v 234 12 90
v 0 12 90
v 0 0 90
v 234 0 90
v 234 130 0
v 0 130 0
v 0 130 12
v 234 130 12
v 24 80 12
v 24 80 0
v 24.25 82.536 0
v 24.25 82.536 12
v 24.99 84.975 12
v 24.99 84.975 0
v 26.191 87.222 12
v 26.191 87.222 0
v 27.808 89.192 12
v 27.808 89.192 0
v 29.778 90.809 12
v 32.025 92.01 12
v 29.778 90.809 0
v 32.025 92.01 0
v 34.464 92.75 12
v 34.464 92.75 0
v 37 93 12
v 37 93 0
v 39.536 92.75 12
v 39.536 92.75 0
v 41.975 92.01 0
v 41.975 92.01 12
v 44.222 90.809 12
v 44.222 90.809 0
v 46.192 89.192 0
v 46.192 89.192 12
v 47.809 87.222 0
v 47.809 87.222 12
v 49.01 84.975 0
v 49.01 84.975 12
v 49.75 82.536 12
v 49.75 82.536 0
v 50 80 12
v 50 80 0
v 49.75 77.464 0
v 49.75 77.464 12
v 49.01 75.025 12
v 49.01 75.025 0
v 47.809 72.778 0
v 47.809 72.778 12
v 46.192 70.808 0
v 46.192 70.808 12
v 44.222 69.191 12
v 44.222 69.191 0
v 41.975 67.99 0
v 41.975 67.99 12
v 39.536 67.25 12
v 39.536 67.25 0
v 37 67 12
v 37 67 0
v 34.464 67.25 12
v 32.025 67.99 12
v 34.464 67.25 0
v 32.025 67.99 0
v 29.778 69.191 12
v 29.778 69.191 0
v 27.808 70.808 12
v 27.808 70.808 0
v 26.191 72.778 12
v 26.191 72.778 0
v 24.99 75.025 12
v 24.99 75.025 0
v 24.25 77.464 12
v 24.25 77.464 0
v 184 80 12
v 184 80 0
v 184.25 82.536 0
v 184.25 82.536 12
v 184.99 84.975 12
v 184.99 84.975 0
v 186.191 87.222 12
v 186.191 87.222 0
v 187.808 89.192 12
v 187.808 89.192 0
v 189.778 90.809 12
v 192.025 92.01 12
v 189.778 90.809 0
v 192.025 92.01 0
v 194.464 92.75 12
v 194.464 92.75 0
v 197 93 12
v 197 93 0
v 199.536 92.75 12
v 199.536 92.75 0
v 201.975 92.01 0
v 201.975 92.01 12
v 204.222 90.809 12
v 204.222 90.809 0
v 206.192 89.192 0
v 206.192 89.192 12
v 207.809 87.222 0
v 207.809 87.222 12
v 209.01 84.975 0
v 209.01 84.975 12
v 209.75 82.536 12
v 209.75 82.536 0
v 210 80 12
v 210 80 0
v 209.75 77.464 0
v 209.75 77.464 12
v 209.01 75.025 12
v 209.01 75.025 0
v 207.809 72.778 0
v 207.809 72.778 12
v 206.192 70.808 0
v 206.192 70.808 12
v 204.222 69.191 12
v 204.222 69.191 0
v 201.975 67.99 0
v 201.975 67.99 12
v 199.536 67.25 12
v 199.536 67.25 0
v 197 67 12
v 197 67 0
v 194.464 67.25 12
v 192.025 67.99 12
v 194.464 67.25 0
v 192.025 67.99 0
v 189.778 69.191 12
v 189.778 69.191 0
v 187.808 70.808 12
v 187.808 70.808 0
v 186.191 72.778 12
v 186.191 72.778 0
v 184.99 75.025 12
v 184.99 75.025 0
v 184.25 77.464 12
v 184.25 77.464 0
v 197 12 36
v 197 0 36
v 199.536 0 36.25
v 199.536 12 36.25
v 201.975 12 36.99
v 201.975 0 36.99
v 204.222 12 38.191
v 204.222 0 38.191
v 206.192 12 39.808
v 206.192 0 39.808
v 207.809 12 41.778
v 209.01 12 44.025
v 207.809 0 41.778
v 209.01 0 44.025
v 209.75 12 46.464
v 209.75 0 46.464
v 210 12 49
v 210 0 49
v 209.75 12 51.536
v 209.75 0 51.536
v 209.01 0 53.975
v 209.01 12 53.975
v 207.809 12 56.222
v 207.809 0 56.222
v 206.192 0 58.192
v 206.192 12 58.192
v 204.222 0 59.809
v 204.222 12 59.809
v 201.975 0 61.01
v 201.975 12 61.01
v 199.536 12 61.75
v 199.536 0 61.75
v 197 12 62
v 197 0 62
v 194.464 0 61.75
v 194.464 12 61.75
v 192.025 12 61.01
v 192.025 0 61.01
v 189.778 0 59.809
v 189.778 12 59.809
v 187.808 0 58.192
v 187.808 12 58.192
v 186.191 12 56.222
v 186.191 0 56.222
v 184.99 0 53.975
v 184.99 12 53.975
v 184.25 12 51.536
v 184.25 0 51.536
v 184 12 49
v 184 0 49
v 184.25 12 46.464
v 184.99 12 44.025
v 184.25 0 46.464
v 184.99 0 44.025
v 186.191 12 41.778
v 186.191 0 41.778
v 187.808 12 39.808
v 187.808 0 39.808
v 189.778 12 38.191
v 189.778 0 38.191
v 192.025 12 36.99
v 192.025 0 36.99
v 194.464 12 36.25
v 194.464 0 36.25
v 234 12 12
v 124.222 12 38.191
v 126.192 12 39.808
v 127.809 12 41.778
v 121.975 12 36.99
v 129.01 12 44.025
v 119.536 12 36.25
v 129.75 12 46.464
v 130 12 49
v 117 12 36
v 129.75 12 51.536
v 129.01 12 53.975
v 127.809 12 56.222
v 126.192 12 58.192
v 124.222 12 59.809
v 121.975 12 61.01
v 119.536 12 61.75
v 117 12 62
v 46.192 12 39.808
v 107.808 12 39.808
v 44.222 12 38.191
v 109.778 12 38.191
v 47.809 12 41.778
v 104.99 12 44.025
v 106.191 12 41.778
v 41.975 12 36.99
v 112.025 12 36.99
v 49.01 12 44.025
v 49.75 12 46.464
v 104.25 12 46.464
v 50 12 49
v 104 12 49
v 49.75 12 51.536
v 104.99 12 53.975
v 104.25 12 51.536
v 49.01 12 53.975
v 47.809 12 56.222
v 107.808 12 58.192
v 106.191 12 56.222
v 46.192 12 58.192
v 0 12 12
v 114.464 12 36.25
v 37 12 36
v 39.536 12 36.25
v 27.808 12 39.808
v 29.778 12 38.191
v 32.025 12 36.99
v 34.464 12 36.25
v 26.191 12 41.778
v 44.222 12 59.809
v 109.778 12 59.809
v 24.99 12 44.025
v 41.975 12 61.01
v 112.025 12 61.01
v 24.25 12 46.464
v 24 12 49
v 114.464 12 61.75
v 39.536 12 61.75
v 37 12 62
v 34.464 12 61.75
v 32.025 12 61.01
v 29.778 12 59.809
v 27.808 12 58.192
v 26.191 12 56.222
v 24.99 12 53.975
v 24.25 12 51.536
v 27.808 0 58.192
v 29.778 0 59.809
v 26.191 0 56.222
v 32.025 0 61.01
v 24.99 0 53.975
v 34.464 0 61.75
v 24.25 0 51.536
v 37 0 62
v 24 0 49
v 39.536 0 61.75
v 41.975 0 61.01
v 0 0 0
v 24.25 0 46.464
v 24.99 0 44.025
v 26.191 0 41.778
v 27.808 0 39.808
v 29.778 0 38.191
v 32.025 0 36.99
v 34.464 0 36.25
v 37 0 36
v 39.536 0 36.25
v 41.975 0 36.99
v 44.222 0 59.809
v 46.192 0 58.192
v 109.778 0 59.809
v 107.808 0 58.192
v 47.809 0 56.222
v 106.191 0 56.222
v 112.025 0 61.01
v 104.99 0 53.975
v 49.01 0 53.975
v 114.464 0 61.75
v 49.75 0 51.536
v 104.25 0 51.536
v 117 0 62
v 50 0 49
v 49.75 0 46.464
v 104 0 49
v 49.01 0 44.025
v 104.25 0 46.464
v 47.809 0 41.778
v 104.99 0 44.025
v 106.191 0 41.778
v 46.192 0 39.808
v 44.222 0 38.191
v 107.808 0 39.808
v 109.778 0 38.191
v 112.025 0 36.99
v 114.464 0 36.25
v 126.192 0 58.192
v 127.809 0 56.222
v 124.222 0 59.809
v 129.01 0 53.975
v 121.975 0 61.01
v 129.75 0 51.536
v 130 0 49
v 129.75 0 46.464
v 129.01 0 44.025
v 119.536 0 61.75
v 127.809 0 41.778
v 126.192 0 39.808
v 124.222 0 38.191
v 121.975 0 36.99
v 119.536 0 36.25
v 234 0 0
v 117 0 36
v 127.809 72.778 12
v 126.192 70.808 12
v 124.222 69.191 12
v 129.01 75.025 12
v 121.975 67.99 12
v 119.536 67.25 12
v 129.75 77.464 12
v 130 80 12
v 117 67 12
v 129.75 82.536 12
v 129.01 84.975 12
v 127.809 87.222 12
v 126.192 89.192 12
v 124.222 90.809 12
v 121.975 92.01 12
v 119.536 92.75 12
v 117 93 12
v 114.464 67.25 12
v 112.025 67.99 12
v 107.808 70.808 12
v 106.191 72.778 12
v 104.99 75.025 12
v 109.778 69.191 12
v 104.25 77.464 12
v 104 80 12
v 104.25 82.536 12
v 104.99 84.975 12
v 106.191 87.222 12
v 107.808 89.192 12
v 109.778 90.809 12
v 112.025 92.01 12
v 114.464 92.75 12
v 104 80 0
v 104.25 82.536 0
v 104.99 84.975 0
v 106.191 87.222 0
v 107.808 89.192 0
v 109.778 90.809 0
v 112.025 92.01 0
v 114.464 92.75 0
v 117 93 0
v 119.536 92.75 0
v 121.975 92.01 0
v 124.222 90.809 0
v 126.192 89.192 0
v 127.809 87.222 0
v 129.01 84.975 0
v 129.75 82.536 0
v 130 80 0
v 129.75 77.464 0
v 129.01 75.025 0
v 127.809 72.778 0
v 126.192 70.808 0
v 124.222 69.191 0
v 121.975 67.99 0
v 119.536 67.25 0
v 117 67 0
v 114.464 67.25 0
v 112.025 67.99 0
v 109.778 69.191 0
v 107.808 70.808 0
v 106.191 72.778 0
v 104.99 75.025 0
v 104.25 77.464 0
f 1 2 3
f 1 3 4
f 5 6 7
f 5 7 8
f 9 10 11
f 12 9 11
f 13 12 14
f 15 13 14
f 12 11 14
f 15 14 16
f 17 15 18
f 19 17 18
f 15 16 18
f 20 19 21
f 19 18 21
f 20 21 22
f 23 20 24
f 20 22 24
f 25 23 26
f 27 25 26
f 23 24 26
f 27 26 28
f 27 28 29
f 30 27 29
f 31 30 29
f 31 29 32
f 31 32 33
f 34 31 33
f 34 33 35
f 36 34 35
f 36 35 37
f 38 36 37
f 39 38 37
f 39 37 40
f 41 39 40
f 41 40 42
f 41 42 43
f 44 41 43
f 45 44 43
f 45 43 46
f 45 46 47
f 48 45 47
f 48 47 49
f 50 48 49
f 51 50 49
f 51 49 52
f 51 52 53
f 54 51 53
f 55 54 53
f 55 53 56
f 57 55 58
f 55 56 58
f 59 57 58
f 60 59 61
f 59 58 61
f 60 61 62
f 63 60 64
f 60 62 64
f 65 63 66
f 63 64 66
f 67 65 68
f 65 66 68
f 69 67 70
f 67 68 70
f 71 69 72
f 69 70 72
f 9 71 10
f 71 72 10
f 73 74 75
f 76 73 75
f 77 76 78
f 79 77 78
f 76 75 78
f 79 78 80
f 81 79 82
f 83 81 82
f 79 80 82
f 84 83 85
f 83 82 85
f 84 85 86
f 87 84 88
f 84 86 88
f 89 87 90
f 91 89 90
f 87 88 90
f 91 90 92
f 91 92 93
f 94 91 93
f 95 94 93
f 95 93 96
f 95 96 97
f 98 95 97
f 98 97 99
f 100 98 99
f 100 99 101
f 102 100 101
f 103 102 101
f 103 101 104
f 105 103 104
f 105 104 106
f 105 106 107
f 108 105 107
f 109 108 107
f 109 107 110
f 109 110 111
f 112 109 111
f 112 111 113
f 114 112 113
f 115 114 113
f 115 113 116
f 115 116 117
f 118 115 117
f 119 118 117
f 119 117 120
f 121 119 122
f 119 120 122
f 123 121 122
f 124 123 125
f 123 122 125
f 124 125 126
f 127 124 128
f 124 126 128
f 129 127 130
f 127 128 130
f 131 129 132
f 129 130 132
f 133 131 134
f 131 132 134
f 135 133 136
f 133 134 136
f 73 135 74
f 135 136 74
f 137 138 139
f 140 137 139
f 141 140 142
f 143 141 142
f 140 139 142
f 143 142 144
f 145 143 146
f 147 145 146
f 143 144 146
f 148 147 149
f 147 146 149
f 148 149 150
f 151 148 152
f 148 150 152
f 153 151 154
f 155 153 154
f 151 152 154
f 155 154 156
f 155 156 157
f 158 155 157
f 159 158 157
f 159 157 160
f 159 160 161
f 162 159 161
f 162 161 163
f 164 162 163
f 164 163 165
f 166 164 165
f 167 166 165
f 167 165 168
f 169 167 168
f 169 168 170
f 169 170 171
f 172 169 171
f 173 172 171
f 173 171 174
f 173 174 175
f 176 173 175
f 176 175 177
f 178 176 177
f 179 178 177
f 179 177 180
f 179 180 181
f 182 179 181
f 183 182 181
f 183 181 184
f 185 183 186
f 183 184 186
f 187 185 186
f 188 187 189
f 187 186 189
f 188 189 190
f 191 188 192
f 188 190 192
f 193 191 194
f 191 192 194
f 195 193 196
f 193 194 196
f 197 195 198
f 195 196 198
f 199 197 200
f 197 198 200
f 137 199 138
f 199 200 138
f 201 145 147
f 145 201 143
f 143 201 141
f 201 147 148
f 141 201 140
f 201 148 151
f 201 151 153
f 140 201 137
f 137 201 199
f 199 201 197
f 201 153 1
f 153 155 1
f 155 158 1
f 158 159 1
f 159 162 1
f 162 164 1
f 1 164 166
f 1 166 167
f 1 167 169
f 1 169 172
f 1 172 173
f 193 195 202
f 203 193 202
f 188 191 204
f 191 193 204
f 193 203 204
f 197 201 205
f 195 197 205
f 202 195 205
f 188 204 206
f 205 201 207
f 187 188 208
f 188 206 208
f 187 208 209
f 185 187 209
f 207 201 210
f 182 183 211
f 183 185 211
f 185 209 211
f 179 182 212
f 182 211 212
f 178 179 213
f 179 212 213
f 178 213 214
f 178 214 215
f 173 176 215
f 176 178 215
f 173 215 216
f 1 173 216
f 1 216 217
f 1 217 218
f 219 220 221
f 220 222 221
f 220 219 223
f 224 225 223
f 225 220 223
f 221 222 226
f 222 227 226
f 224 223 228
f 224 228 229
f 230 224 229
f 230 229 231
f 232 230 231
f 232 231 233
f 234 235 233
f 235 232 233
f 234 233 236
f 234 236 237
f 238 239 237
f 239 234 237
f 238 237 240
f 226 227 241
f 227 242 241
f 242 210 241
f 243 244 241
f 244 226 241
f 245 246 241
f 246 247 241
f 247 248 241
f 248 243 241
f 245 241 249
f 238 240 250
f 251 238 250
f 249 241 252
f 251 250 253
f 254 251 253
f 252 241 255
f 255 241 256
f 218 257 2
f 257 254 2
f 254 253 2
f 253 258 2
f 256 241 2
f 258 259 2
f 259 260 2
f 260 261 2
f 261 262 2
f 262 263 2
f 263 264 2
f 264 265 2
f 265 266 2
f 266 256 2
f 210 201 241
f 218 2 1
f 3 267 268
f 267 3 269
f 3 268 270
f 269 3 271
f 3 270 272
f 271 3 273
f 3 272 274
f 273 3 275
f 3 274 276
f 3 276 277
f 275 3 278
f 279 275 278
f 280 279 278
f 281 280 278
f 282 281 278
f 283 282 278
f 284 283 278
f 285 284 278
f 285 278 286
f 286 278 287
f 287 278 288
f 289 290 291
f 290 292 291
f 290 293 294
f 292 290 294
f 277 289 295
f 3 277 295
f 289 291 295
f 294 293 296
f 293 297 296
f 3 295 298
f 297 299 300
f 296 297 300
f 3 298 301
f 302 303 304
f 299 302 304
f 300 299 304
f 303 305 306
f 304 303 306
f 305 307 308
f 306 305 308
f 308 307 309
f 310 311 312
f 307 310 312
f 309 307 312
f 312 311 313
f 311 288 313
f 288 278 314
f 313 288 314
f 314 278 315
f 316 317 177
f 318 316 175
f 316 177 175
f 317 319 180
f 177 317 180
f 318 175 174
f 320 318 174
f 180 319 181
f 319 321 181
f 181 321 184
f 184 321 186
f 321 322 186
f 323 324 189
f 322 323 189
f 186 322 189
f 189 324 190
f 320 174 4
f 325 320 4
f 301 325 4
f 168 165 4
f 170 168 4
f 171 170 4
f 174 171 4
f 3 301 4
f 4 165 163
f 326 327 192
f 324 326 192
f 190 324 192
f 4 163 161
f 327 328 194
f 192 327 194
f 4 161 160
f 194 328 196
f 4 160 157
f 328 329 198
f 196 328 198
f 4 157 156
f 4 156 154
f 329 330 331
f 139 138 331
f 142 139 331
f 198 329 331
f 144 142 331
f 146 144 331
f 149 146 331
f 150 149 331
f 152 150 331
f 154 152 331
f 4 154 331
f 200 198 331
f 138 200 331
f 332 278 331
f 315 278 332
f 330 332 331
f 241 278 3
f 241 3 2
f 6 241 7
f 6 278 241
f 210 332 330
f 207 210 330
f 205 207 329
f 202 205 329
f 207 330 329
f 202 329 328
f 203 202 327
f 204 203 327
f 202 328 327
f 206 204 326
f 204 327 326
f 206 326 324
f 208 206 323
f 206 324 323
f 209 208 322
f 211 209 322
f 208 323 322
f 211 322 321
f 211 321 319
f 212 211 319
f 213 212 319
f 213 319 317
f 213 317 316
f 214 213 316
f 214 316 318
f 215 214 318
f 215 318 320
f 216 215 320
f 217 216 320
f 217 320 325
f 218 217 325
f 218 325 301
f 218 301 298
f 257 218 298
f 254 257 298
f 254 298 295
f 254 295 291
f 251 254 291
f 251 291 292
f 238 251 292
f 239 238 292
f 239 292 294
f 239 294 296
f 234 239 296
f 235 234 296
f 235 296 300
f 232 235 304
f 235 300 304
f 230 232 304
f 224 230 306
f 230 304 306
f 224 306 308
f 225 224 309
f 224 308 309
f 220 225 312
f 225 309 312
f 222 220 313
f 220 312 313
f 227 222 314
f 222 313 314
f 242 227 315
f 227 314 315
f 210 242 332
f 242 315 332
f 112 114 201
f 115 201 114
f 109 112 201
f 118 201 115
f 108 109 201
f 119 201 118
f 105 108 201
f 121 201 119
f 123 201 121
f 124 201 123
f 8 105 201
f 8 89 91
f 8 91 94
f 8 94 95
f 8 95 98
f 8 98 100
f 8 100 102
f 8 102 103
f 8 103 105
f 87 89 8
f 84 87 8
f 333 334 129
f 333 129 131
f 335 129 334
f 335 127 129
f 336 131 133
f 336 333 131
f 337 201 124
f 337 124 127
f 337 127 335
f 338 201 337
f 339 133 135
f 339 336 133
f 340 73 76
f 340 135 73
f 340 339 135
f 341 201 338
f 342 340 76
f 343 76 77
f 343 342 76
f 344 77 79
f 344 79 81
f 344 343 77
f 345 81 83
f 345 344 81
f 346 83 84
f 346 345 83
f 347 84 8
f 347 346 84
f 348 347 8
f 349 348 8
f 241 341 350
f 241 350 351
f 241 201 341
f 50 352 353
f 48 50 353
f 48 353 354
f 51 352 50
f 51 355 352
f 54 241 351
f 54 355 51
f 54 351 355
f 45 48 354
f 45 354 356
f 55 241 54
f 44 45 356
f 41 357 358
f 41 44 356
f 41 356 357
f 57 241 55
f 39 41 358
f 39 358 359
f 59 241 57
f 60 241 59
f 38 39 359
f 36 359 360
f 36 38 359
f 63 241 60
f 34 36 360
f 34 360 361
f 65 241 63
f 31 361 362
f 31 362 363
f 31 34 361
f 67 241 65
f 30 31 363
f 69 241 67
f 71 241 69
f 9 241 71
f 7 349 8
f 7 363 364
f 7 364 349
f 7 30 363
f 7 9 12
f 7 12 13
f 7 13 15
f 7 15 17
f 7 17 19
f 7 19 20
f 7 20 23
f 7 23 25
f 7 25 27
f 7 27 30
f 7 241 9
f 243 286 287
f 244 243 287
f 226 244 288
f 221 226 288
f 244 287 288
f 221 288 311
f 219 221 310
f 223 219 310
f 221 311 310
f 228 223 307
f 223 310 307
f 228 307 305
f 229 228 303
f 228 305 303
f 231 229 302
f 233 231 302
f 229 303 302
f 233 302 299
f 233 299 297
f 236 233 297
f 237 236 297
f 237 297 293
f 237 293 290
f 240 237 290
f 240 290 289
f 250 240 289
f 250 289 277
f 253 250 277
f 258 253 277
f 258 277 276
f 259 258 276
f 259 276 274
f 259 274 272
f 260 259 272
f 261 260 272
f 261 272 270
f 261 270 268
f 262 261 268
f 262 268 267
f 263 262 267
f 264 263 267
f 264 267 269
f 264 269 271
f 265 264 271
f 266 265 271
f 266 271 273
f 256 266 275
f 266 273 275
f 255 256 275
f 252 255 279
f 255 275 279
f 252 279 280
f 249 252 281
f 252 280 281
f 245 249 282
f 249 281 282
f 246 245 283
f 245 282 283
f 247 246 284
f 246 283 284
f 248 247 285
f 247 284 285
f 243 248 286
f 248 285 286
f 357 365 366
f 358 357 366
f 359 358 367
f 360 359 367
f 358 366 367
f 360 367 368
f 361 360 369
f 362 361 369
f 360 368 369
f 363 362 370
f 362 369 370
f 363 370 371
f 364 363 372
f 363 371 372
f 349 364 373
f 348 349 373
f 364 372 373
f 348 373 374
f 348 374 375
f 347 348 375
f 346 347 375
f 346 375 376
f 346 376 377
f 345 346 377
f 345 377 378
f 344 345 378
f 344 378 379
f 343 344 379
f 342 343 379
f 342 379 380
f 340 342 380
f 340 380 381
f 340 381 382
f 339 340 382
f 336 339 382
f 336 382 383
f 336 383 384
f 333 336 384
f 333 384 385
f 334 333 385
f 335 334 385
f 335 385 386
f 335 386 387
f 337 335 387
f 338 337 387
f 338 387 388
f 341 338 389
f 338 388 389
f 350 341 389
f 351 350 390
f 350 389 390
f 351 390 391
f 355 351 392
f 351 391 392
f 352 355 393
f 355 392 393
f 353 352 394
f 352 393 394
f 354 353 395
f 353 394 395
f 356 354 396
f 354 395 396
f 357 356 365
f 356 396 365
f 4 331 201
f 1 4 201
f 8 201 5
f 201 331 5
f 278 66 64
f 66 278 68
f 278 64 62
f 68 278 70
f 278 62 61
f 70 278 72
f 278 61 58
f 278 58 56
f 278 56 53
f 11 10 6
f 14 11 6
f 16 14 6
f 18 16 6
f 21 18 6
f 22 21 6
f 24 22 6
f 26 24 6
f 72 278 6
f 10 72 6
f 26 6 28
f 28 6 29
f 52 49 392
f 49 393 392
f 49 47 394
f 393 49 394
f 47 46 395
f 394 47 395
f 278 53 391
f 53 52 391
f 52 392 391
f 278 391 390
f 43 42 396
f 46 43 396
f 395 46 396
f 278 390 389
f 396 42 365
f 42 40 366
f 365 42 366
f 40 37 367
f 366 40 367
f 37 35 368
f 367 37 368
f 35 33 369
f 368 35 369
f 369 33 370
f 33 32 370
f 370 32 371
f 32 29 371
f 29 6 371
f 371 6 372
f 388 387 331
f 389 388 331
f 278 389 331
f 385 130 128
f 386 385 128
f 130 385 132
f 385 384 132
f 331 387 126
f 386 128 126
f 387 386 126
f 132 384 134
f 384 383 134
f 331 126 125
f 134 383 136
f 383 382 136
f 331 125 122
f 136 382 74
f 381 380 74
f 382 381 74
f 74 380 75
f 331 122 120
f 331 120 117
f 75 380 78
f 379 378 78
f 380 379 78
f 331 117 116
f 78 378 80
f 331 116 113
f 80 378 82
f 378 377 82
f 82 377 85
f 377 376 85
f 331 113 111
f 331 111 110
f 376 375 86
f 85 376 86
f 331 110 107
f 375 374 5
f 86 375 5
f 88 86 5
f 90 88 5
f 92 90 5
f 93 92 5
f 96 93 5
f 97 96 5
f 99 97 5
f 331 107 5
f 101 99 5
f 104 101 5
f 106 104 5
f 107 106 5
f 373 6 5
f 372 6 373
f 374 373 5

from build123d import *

# Parameters (mm, degrees)
SKETCH_1_W             = 234
SKETCH_1_H             = 130
EXTRUDE_1_DEPTH        = 90
SKETCH_2_W             = 78
SKETCH_2_H             = 118
CUT_EXTRUDE_1_DEPTH    = 283.411047943
SKETCH_3_R             = 13
CUT_EXTRUDE_2_DEPTH    = 283.411047943
PATTERN_LINEAR_1_COUNT = 3
PATTERN_LINEAR_1_PITCH = 80
SKETCH_4_R             = 13
CUT_EXTRUDE_3_DEPTH    = 283.411047943
PATTERN_LINEAR_2_COUNT = 3
PATTERN_LINEAR_2_PITCH = 80


with BuildPart() as part:
    # 草图1 → 凸台-拉伸1 (new body)
    with BuildSketch(Plane.XY):
        with Locations((117, 65)):
            Rectangle(SKETCH_1_W, SKETCH_1_H)
    extrude(amount=EXTRUDE_1_DEPTH)

    # 草图2 → 切除-拉伸1 (cut, through all)
    with BuildSketch(Plane.ZY):
        with Locations((51, 71)):
            Rectangle(SKETCH_2_W, SKETCH_2_H)
    extrude(amount=-CUT_EXTRUDE_1_DEPTH, mode=Mode.SUBTRACT)

    # 草图3 → 切除-拉伸2 (cut, through all)
    with BuildSketch(Plane(origin=(0, 0, 0), x_dir=(-1, 0, 0), z_dir=(0, 0, -1))):
        with Locations((-197, 80)):
            Circle(SKETCH_3_R)
    cut_extrude_2 = extrude(amount=-CUT_EXTRUDE_2_DEPTH, mode=Mode.SUBTRACT)

    # 阵列(线性)1: 切除-拉伸2 ×3
    with Locations(*[(-i * PATTERN_LINEAR_1_PITCH, 0, 0) for i in range(1, PATTERN_LINEAR_1_COUNT)]):
        add(cut_extrude_2, mode=Mode.SUBTRACT)

    # 草图4 → 切除-拉伸3 (cut, through all)
    with BuildSketch(Plane.XZ):
        with Locations(Location((37, 49, 0), (0, 0, 270))):
            Circle(SKETCH_4_R)
    cut_extrude_3 = extrude(amount=-CUT_EXTRUDE_3_DEPTH, mode=Mode.SUBTRACT)

    # 阵列(线性)2: 切除-拉伸3 ×3
    with Locations(*[(i * PATTERN_LINEAR_2_PITCH, 0, 0) for i in range(1, PATTERN_LINEAR_2_COUNT)]):
        add(cut_extrude_3, mode=Mode.SUBTRACT)


solid = part.part
